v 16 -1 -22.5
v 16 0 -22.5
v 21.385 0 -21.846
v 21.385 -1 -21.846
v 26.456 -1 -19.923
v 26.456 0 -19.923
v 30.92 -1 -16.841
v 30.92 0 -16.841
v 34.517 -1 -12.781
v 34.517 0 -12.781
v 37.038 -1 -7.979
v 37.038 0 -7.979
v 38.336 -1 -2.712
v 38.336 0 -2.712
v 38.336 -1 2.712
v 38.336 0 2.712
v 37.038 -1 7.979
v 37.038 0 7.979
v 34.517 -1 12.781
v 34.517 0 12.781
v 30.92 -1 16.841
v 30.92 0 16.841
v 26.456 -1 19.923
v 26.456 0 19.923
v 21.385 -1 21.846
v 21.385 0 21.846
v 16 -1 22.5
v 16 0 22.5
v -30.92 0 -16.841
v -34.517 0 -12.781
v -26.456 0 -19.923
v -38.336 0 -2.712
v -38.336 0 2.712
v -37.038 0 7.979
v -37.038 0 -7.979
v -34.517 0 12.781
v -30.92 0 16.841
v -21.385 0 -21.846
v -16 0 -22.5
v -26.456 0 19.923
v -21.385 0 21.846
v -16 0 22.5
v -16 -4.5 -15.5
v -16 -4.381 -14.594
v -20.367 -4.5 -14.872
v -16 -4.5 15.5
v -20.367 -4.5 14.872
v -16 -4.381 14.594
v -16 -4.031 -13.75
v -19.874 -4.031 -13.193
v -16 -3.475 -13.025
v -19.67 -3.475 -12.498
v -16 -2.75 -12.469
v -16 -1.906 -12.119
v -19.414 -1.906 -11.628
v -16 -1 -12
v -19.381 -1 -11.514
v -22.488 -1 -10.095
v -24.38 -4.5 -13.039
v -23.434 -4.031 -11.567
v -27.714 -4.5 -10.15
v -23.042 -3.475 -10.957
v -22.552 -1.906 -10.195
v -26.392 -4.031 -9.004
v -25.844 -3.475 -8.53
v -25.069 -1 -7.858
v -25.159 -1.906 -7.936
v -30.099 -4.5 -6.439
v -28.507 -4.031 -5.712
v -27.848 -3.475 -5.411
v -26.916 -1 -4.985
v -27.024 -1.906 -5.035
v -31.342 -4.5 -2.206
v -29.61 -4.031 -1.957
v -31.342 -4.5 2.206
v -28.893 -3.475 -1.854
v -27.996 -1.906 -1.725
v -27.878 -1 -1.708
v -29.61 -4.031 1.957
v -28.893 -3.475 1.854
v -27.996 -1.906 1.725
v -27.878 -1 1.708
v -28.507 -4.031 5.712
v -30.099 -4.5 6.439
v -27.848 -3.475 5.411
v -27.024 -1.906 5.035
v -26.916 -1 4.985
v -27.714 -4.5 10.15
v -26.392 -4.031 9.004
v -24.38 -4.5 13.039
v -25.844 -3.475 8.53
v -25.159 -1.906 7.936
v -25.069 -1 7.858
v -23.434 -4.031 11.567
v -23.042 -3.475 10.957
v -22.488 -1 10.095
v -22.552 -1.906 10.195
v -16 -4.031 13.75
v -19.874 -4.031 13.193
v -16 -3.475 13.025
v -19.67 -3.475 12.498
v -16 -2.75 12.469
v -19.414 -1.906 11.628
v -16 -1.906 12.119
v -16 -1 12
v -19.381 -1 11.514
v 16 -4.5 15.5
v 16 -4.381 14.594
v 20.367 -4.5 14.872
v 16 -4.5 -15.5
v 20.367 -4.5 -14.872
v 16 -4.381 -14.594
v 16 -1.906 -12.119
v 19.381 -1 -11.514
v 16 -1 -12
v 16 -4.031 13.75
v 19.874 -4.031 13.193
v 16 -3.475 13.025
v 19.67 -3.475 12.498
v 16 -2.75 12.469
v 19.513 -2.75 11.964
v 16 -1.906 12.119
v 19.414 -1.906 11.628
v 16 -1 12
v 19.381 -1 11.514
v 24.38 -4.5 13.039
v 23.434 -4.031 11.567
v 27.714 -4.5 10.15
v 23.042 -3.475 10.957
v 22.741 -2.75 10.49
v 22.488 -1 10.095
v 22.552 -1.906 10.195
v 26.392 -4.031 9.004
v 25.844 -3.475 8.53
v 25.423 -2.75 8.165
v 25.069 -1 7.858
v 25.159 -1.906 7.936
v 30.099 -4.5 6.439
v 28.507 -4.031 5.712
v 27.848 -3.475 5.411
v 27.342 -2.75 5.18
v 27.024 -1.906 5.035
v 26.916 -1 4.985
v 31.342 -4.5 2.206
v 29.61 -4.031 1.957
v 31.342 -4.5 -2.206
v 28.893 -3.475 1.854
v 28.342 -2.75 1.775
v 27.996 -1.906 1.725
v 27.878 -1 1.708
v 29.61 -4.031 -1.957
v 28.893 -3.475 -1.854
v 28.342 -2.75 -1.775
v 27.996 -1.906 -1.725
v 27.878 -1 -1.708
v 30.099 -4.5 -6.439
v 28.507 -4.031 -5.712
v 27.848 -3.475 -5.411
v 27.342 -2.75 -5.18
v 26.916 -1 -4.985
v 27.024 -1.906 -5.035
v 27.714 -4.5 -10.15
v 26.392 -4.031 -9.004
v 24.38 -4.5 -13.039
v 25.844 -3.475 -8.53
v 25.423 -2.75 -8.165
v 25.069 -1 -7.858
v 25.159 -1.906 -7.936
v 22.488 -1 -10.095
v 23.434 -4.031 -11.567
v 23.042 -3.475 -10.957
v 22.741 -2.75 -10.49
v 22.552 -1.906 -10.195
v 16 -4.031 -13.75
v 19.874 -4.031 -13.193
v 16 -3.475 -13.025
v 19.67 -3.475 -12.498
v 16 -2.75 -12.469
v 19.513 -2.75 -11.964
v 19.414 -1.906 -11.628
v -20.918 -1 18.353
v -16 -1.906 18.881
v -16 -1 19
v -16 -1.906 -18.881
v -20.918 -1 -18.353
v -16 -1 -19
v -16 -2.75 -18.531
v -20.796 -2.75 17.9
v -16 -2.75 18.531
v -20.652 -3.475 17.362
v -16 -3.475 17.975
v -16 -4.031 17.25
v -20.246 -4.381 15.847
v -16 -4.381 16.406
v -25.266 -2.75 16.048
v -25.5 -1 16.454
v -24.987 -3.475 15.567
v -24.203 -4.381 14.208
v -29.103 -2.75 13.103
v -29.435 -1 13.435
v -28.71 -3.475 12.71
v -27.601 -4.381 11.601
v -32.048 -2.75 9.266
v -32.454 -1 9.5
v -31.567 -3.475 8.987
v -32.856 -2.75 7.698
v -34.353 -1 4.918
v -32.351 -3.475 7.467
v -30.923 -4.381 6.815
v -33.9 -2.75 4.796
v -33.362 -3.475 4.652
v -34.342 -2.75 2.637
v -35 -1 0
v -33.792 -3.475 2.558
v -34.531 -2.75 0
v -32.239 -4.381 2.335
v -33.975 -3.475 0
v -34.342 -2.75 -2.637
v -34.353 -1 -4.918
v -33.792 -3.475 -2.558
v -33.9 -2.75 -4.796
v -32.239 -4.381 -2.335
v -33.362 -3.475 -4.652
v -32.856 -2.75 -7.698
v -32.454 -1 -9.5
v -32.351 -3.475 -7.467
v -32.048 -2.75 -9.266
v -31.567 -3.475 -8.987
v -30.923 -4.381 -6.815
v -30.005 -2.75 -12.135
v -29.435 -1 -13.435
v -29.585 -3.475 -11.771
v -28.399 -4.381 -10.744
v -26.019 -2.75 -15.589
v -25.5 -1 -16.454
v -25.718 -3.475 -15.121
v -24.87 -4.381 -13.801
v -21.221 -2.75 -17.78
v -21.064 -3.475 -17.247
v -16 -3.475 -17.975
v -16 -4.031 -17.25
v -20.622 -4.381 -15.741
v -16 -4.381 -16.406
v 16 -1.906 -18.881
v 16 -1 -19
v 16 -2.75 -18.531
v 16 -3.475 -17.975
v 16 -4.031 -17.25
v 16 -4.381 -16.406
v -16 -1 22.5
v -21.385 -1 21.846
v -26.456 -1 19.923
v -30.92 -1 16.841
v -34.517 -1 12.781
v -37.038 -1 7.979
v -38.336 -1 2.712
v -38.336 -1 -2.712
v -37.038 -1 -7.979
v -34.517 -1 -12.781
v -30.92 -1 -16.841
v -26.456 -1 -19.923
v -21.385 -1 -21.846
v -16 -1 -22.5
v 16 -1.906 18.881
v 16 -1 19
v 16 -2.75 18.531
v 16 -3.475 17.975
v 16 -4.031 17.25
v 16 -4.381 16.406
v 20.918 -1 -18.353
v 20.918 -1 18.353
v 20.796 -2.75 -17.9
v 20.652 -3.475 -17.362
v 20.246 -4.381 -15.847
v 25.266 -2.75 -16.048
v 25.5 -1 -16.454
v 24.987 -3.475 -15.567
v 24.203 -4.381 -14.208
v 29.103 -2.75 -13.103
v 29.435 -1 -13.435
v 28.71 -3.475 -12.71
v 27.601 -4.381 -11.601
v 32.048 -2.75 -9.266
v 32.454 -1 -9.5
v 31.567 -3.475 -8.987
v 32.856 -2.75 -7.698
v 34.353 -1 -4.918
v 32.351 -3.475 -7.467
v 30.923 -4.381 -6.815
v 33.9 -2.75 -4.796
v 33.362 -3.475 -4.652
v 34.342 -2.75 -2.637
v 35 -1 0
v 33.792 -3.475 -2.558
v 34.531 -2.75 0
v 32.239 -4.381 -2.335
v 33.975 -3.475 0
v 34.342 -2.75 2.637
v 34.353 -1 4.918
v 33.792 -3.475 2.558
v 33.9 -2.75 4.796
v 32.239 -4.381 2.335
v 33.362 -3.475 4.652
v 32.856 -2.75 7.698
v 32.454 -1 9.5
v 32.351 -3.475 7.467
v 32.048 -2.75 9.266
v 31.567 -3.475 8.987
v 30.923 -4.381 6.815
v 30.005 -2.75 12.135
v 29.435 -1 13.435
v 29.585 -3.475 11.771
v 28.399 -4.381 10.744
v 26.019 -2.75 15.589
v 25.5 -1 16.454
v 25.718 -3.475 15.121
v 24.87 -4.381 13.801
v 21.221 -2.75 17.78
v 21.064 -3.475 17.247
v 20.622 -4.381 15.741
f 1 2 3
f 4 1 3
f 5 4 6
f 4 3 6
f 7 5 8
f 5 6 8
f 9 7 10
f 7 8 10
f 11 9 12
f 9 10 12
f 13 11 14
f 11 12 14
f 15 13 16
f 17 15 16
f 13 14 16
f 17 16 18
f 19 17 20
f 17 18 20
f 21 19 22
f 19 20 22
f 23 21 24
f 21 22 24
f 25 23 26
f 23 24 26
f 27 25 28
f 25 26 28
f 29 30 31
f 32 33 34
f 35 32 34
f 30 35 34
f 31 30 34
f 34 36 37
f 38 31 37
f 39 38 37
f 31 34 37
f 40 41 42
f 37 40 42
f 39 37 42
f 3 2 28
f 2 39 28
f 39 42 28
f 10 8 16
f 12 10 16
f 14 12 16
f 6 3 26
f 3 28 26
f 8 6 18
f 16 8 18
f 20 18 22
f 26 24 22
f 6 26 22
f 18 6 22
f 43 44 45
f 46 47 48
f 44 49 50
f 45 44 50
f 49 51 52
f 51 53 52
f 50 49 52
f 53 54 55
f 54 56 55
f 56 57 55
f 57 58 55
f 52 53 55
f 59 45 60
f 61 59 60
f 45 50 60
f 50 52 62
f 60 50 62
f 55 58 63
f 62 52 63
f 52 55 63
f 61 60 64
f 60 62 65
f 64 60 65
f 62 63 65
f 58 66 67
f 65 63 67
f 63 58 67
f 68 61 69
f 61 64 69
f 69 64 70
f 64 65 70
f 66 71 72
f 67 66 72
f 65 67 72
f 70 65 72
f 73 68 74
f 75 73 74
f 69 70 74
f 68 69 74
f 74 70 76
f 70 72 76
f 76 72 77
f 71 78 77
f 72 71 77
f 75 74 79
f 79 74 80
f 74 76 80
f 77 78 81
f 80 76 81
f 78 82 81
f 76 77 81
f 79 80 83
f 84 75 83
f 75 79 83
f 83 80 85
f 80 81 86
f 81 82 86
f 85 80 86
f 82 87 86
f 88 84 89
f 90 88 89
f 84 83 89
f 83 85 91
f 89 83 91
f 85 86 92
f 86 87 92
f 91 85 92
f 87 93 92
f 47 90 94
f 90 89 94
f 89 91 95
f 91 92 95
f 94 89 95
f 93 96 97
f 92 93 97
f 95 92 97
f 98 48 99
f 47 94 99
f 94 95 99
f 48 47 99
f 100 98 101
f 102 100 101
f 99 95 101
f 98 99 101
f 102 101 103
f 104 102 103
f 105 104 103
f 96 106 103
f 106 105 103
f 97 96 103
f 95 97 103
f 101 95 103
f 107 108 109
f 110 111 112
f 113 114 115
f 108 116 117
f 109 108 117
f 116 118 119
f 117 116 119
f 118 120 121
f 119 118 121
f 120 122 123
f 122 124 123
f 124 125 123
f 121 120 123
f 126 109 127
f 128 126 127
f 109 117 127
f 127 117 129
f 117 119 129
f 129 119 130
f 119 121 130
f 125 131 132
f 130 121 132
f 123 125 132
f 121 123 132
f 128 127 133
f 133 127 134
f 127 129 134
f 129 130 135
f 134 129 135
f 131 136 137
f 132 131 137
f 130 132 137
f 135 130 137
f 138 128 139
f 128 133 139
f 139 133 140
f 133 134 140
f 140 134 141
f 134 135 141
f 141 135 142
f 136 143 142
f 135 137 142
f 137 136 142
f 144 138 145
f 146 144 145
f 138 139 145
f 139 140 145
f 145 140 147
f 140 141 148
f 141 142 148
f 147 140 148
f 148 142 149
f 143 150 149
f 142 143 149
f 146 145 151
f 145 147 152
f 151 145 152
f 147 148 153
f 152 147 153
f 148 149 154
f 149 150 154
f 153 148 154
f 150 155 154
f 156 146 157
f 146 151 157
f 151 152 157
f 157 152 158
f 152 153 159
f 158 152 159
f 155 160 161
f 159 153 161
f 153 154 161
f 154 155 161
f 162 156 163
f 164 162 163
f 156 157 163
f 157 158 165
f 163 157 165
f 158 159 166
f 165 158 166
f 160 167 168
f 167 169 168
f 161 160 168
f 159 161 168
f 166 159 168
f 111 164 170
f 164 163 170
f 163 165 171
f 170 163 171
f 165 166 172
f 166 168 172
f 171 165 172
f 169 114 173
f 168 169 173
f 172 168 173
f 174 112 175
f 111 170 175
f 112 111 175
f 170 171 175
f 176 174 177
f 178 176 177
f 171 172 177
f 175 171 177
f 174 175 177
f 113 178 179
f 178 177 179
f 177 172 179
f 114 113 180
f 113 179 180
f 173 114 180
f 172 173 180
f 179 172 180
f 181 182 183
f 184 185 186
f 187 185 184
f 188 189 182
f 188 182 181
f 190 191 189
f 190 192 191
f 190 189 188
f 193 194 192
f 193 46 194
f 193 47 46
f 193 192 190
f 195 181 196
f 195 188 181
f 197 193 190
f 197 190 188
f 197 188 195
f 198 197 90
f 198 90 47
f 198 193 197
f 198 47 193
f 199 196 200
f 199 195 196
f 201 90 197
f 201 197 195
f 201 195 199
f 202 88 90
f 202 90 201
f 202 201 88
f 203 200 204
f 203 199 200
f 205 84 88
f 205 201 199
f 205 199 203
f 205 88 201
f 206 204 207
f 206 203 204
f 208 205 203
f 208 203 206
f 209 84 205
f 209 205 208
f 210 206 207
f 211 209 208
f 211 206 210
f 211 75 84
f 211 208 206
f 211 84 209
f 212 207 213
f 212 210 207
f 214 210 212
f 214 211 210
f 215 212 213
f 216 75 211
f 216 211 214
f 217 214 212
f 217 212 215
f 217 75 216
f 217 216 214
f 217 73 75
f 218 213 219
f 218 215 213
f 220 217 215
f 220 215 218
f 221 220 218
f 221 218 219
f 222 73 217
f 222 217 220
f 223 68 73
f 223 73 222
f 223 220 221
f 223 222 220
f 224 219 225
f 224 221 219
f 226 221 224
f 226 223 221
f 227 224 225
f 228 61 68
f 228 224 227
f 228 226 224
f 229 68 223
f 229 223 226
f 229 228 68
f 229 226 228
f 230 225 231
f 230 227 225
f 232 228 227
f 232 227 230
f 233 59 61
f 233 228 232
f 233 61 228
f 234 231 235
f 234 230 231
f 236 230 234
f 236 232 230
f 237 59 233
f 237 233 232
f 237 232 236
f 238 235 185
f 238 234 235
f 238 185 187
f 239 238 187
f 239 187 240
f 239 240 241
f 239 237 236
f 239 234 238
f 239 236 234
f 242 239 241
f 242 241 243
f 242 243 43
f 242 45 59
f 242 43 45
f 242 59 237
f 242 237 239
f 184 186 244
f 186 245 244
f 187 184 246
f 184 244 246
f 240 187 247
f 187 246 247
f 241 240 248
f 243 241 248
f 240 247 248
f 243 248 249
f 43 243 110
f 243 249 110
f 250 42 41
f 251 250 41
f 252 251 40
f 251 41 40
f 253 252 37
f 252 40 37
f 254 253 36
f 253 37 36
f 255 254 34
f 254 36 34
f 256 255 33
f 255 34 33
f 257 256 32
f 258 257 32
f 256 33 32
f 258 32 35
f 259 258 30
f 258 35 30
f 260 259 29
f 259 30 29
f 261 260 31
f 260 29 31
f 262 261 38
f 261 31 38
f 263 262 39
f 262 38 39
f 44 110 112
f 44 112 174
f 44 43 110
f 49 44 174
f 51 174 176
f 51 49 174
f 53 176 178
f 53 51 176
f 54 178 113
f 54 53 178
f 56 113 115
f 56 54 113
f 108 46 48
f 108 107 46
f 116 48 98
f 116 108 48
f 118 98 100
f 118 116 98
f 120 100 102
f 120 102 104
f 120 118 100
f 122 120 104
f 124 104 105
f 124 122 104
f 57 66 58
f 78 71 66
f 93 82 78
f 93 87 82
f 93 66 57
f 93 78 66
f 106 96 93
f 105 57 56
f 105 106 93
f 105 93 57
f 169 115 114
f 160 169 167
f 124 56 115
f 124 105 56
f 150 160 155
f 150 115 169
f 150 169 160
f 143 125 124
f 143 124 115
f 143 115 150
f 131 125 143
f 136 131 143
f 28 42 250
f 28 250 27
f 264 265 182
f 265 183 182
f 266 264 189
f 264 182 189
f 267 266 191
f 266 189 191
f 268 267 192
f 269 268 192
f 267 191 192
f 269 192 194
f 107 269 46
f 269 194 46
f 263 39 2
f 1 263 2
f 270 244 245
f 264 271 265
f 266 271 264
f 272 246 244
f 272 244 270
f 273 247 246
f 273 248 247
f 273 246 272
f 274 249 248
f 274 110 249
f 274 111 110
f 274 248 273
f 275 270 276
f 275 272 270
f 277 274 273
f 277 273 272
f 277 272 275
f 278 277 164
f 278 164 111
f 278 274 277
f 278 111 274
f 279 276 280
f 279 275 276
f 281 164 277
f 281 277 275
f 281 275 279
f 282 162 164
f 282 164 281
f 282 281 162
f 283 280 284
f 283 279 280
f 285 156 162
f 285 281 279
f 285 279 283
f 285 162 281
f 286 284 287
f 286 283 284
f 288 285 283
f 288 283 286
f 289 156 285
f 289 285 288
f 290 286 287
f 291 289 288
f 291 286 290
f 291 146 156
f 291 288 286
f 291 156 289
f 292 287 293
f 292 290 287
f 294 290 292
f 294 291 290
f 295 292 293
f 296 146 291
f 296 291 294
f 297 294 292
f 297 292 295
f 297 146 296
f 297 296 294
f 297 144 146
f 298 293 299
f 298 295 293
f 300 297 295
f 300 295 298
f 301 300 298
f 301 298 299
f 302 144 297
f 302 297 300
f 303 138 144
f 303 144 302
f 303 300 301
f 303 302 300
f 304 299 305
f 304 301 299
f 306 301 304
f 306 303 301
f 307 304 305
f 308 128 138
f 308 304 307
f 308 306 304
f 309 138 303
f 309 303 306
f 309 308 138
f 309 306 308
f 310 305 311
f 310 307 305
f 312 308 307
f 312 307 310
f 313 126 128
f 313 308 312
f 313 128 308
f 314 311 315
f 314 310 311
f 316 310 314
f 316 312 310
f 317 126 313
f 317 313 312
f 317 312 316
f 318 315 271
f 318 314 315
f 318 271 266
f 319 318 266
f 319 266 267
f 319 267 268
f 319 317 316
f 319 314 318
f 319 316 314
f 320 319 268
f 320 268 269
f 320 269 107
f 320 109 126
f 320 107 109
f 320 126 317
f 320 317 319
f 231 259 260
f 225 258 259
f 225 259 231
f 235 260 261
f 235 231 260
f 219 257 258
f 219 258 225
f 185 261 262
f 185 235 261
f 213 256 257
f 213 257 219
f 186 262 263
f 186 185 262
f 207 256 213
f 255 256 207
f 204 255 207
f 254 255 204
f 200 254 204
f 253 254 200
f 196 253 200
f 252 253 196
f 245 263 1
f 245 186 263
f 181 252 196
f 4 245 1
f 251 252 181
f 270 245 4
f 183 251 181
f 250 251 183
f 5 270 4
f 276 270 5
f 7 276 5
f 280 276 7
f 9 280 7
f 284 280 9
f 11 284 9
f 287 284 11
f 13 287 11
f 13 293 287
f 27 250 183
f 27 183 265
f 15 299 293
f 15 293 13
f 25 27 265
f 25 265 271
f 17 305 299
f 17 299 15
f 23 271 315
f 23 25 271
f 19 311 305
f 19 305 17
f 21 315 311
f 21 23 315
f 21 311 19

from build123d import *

# Parameters (mm, degrees)
F0_W     = 32
F0_H     = 45
F1_DEPTH = 1
F3_DEPTH = 3.5
F4_R     = 3.49999


# Not quite as in the source:
# - a fillet or chamfer is up to 0.001 mm smaller than in the source, because OpenCascade refuses the exact size


with BuildPart() as f1:
    # F0 (on Front) → F1 (new body)
    with BuildSketch(Plane.XZ):
        with BuildLine():
            Line((16, 22.5), (16, -22.5))
            ThreePointArc((16, -22.5), (38.5, 0), (16, 22.5))
        make_face()
        Rectangle(F0_W, F0_H)
        with BuildLine():
            ThreePointArc((-16, 22.5), (-38.5, 0), (-16, -22.5))
            Line((-16, -22.5), (-16, 22.5))
        make_face()
    extrude(amount=F1_DEPTH)

    # F2 (on face) → F3 (join)
    with BuildSketch(Plane.XZ.offset(1)):
        with BuildLine():
            ThreePointArc((16, -19), (35, 0), (16, 19))
            Line((16, 19), (-16, 19))
            ThreePointArc((-16, 19), (-35, 0), (-16, -19))
            Line((-16, -19), (16, -19))
        make_face()
        with BuildLine():
            ThreePointArc((-16, -12), (-28, 0), (-16, 12))
            Line((-16, 12), (16, 12))
            ThreePointArc((16, 12), (28, 0), (16, -12))
            Line((16, -12), (-16, -12))
        make_face(mode=Mode.SUBTRACT)
    extrude(amount=F3_DEPTH)

    # F4 (radius 3.5 in the source; OpenCascade refuses exactly that, so slightly less here)
    f4_edges = [f1.edges().sort_by_distance(p)[0] for p in [
        (0, -4.5, 19),
        (0, -4.5, 12),
    ]]
    fillet(f4_edges, radius=F4_R)


solid = f1.part
